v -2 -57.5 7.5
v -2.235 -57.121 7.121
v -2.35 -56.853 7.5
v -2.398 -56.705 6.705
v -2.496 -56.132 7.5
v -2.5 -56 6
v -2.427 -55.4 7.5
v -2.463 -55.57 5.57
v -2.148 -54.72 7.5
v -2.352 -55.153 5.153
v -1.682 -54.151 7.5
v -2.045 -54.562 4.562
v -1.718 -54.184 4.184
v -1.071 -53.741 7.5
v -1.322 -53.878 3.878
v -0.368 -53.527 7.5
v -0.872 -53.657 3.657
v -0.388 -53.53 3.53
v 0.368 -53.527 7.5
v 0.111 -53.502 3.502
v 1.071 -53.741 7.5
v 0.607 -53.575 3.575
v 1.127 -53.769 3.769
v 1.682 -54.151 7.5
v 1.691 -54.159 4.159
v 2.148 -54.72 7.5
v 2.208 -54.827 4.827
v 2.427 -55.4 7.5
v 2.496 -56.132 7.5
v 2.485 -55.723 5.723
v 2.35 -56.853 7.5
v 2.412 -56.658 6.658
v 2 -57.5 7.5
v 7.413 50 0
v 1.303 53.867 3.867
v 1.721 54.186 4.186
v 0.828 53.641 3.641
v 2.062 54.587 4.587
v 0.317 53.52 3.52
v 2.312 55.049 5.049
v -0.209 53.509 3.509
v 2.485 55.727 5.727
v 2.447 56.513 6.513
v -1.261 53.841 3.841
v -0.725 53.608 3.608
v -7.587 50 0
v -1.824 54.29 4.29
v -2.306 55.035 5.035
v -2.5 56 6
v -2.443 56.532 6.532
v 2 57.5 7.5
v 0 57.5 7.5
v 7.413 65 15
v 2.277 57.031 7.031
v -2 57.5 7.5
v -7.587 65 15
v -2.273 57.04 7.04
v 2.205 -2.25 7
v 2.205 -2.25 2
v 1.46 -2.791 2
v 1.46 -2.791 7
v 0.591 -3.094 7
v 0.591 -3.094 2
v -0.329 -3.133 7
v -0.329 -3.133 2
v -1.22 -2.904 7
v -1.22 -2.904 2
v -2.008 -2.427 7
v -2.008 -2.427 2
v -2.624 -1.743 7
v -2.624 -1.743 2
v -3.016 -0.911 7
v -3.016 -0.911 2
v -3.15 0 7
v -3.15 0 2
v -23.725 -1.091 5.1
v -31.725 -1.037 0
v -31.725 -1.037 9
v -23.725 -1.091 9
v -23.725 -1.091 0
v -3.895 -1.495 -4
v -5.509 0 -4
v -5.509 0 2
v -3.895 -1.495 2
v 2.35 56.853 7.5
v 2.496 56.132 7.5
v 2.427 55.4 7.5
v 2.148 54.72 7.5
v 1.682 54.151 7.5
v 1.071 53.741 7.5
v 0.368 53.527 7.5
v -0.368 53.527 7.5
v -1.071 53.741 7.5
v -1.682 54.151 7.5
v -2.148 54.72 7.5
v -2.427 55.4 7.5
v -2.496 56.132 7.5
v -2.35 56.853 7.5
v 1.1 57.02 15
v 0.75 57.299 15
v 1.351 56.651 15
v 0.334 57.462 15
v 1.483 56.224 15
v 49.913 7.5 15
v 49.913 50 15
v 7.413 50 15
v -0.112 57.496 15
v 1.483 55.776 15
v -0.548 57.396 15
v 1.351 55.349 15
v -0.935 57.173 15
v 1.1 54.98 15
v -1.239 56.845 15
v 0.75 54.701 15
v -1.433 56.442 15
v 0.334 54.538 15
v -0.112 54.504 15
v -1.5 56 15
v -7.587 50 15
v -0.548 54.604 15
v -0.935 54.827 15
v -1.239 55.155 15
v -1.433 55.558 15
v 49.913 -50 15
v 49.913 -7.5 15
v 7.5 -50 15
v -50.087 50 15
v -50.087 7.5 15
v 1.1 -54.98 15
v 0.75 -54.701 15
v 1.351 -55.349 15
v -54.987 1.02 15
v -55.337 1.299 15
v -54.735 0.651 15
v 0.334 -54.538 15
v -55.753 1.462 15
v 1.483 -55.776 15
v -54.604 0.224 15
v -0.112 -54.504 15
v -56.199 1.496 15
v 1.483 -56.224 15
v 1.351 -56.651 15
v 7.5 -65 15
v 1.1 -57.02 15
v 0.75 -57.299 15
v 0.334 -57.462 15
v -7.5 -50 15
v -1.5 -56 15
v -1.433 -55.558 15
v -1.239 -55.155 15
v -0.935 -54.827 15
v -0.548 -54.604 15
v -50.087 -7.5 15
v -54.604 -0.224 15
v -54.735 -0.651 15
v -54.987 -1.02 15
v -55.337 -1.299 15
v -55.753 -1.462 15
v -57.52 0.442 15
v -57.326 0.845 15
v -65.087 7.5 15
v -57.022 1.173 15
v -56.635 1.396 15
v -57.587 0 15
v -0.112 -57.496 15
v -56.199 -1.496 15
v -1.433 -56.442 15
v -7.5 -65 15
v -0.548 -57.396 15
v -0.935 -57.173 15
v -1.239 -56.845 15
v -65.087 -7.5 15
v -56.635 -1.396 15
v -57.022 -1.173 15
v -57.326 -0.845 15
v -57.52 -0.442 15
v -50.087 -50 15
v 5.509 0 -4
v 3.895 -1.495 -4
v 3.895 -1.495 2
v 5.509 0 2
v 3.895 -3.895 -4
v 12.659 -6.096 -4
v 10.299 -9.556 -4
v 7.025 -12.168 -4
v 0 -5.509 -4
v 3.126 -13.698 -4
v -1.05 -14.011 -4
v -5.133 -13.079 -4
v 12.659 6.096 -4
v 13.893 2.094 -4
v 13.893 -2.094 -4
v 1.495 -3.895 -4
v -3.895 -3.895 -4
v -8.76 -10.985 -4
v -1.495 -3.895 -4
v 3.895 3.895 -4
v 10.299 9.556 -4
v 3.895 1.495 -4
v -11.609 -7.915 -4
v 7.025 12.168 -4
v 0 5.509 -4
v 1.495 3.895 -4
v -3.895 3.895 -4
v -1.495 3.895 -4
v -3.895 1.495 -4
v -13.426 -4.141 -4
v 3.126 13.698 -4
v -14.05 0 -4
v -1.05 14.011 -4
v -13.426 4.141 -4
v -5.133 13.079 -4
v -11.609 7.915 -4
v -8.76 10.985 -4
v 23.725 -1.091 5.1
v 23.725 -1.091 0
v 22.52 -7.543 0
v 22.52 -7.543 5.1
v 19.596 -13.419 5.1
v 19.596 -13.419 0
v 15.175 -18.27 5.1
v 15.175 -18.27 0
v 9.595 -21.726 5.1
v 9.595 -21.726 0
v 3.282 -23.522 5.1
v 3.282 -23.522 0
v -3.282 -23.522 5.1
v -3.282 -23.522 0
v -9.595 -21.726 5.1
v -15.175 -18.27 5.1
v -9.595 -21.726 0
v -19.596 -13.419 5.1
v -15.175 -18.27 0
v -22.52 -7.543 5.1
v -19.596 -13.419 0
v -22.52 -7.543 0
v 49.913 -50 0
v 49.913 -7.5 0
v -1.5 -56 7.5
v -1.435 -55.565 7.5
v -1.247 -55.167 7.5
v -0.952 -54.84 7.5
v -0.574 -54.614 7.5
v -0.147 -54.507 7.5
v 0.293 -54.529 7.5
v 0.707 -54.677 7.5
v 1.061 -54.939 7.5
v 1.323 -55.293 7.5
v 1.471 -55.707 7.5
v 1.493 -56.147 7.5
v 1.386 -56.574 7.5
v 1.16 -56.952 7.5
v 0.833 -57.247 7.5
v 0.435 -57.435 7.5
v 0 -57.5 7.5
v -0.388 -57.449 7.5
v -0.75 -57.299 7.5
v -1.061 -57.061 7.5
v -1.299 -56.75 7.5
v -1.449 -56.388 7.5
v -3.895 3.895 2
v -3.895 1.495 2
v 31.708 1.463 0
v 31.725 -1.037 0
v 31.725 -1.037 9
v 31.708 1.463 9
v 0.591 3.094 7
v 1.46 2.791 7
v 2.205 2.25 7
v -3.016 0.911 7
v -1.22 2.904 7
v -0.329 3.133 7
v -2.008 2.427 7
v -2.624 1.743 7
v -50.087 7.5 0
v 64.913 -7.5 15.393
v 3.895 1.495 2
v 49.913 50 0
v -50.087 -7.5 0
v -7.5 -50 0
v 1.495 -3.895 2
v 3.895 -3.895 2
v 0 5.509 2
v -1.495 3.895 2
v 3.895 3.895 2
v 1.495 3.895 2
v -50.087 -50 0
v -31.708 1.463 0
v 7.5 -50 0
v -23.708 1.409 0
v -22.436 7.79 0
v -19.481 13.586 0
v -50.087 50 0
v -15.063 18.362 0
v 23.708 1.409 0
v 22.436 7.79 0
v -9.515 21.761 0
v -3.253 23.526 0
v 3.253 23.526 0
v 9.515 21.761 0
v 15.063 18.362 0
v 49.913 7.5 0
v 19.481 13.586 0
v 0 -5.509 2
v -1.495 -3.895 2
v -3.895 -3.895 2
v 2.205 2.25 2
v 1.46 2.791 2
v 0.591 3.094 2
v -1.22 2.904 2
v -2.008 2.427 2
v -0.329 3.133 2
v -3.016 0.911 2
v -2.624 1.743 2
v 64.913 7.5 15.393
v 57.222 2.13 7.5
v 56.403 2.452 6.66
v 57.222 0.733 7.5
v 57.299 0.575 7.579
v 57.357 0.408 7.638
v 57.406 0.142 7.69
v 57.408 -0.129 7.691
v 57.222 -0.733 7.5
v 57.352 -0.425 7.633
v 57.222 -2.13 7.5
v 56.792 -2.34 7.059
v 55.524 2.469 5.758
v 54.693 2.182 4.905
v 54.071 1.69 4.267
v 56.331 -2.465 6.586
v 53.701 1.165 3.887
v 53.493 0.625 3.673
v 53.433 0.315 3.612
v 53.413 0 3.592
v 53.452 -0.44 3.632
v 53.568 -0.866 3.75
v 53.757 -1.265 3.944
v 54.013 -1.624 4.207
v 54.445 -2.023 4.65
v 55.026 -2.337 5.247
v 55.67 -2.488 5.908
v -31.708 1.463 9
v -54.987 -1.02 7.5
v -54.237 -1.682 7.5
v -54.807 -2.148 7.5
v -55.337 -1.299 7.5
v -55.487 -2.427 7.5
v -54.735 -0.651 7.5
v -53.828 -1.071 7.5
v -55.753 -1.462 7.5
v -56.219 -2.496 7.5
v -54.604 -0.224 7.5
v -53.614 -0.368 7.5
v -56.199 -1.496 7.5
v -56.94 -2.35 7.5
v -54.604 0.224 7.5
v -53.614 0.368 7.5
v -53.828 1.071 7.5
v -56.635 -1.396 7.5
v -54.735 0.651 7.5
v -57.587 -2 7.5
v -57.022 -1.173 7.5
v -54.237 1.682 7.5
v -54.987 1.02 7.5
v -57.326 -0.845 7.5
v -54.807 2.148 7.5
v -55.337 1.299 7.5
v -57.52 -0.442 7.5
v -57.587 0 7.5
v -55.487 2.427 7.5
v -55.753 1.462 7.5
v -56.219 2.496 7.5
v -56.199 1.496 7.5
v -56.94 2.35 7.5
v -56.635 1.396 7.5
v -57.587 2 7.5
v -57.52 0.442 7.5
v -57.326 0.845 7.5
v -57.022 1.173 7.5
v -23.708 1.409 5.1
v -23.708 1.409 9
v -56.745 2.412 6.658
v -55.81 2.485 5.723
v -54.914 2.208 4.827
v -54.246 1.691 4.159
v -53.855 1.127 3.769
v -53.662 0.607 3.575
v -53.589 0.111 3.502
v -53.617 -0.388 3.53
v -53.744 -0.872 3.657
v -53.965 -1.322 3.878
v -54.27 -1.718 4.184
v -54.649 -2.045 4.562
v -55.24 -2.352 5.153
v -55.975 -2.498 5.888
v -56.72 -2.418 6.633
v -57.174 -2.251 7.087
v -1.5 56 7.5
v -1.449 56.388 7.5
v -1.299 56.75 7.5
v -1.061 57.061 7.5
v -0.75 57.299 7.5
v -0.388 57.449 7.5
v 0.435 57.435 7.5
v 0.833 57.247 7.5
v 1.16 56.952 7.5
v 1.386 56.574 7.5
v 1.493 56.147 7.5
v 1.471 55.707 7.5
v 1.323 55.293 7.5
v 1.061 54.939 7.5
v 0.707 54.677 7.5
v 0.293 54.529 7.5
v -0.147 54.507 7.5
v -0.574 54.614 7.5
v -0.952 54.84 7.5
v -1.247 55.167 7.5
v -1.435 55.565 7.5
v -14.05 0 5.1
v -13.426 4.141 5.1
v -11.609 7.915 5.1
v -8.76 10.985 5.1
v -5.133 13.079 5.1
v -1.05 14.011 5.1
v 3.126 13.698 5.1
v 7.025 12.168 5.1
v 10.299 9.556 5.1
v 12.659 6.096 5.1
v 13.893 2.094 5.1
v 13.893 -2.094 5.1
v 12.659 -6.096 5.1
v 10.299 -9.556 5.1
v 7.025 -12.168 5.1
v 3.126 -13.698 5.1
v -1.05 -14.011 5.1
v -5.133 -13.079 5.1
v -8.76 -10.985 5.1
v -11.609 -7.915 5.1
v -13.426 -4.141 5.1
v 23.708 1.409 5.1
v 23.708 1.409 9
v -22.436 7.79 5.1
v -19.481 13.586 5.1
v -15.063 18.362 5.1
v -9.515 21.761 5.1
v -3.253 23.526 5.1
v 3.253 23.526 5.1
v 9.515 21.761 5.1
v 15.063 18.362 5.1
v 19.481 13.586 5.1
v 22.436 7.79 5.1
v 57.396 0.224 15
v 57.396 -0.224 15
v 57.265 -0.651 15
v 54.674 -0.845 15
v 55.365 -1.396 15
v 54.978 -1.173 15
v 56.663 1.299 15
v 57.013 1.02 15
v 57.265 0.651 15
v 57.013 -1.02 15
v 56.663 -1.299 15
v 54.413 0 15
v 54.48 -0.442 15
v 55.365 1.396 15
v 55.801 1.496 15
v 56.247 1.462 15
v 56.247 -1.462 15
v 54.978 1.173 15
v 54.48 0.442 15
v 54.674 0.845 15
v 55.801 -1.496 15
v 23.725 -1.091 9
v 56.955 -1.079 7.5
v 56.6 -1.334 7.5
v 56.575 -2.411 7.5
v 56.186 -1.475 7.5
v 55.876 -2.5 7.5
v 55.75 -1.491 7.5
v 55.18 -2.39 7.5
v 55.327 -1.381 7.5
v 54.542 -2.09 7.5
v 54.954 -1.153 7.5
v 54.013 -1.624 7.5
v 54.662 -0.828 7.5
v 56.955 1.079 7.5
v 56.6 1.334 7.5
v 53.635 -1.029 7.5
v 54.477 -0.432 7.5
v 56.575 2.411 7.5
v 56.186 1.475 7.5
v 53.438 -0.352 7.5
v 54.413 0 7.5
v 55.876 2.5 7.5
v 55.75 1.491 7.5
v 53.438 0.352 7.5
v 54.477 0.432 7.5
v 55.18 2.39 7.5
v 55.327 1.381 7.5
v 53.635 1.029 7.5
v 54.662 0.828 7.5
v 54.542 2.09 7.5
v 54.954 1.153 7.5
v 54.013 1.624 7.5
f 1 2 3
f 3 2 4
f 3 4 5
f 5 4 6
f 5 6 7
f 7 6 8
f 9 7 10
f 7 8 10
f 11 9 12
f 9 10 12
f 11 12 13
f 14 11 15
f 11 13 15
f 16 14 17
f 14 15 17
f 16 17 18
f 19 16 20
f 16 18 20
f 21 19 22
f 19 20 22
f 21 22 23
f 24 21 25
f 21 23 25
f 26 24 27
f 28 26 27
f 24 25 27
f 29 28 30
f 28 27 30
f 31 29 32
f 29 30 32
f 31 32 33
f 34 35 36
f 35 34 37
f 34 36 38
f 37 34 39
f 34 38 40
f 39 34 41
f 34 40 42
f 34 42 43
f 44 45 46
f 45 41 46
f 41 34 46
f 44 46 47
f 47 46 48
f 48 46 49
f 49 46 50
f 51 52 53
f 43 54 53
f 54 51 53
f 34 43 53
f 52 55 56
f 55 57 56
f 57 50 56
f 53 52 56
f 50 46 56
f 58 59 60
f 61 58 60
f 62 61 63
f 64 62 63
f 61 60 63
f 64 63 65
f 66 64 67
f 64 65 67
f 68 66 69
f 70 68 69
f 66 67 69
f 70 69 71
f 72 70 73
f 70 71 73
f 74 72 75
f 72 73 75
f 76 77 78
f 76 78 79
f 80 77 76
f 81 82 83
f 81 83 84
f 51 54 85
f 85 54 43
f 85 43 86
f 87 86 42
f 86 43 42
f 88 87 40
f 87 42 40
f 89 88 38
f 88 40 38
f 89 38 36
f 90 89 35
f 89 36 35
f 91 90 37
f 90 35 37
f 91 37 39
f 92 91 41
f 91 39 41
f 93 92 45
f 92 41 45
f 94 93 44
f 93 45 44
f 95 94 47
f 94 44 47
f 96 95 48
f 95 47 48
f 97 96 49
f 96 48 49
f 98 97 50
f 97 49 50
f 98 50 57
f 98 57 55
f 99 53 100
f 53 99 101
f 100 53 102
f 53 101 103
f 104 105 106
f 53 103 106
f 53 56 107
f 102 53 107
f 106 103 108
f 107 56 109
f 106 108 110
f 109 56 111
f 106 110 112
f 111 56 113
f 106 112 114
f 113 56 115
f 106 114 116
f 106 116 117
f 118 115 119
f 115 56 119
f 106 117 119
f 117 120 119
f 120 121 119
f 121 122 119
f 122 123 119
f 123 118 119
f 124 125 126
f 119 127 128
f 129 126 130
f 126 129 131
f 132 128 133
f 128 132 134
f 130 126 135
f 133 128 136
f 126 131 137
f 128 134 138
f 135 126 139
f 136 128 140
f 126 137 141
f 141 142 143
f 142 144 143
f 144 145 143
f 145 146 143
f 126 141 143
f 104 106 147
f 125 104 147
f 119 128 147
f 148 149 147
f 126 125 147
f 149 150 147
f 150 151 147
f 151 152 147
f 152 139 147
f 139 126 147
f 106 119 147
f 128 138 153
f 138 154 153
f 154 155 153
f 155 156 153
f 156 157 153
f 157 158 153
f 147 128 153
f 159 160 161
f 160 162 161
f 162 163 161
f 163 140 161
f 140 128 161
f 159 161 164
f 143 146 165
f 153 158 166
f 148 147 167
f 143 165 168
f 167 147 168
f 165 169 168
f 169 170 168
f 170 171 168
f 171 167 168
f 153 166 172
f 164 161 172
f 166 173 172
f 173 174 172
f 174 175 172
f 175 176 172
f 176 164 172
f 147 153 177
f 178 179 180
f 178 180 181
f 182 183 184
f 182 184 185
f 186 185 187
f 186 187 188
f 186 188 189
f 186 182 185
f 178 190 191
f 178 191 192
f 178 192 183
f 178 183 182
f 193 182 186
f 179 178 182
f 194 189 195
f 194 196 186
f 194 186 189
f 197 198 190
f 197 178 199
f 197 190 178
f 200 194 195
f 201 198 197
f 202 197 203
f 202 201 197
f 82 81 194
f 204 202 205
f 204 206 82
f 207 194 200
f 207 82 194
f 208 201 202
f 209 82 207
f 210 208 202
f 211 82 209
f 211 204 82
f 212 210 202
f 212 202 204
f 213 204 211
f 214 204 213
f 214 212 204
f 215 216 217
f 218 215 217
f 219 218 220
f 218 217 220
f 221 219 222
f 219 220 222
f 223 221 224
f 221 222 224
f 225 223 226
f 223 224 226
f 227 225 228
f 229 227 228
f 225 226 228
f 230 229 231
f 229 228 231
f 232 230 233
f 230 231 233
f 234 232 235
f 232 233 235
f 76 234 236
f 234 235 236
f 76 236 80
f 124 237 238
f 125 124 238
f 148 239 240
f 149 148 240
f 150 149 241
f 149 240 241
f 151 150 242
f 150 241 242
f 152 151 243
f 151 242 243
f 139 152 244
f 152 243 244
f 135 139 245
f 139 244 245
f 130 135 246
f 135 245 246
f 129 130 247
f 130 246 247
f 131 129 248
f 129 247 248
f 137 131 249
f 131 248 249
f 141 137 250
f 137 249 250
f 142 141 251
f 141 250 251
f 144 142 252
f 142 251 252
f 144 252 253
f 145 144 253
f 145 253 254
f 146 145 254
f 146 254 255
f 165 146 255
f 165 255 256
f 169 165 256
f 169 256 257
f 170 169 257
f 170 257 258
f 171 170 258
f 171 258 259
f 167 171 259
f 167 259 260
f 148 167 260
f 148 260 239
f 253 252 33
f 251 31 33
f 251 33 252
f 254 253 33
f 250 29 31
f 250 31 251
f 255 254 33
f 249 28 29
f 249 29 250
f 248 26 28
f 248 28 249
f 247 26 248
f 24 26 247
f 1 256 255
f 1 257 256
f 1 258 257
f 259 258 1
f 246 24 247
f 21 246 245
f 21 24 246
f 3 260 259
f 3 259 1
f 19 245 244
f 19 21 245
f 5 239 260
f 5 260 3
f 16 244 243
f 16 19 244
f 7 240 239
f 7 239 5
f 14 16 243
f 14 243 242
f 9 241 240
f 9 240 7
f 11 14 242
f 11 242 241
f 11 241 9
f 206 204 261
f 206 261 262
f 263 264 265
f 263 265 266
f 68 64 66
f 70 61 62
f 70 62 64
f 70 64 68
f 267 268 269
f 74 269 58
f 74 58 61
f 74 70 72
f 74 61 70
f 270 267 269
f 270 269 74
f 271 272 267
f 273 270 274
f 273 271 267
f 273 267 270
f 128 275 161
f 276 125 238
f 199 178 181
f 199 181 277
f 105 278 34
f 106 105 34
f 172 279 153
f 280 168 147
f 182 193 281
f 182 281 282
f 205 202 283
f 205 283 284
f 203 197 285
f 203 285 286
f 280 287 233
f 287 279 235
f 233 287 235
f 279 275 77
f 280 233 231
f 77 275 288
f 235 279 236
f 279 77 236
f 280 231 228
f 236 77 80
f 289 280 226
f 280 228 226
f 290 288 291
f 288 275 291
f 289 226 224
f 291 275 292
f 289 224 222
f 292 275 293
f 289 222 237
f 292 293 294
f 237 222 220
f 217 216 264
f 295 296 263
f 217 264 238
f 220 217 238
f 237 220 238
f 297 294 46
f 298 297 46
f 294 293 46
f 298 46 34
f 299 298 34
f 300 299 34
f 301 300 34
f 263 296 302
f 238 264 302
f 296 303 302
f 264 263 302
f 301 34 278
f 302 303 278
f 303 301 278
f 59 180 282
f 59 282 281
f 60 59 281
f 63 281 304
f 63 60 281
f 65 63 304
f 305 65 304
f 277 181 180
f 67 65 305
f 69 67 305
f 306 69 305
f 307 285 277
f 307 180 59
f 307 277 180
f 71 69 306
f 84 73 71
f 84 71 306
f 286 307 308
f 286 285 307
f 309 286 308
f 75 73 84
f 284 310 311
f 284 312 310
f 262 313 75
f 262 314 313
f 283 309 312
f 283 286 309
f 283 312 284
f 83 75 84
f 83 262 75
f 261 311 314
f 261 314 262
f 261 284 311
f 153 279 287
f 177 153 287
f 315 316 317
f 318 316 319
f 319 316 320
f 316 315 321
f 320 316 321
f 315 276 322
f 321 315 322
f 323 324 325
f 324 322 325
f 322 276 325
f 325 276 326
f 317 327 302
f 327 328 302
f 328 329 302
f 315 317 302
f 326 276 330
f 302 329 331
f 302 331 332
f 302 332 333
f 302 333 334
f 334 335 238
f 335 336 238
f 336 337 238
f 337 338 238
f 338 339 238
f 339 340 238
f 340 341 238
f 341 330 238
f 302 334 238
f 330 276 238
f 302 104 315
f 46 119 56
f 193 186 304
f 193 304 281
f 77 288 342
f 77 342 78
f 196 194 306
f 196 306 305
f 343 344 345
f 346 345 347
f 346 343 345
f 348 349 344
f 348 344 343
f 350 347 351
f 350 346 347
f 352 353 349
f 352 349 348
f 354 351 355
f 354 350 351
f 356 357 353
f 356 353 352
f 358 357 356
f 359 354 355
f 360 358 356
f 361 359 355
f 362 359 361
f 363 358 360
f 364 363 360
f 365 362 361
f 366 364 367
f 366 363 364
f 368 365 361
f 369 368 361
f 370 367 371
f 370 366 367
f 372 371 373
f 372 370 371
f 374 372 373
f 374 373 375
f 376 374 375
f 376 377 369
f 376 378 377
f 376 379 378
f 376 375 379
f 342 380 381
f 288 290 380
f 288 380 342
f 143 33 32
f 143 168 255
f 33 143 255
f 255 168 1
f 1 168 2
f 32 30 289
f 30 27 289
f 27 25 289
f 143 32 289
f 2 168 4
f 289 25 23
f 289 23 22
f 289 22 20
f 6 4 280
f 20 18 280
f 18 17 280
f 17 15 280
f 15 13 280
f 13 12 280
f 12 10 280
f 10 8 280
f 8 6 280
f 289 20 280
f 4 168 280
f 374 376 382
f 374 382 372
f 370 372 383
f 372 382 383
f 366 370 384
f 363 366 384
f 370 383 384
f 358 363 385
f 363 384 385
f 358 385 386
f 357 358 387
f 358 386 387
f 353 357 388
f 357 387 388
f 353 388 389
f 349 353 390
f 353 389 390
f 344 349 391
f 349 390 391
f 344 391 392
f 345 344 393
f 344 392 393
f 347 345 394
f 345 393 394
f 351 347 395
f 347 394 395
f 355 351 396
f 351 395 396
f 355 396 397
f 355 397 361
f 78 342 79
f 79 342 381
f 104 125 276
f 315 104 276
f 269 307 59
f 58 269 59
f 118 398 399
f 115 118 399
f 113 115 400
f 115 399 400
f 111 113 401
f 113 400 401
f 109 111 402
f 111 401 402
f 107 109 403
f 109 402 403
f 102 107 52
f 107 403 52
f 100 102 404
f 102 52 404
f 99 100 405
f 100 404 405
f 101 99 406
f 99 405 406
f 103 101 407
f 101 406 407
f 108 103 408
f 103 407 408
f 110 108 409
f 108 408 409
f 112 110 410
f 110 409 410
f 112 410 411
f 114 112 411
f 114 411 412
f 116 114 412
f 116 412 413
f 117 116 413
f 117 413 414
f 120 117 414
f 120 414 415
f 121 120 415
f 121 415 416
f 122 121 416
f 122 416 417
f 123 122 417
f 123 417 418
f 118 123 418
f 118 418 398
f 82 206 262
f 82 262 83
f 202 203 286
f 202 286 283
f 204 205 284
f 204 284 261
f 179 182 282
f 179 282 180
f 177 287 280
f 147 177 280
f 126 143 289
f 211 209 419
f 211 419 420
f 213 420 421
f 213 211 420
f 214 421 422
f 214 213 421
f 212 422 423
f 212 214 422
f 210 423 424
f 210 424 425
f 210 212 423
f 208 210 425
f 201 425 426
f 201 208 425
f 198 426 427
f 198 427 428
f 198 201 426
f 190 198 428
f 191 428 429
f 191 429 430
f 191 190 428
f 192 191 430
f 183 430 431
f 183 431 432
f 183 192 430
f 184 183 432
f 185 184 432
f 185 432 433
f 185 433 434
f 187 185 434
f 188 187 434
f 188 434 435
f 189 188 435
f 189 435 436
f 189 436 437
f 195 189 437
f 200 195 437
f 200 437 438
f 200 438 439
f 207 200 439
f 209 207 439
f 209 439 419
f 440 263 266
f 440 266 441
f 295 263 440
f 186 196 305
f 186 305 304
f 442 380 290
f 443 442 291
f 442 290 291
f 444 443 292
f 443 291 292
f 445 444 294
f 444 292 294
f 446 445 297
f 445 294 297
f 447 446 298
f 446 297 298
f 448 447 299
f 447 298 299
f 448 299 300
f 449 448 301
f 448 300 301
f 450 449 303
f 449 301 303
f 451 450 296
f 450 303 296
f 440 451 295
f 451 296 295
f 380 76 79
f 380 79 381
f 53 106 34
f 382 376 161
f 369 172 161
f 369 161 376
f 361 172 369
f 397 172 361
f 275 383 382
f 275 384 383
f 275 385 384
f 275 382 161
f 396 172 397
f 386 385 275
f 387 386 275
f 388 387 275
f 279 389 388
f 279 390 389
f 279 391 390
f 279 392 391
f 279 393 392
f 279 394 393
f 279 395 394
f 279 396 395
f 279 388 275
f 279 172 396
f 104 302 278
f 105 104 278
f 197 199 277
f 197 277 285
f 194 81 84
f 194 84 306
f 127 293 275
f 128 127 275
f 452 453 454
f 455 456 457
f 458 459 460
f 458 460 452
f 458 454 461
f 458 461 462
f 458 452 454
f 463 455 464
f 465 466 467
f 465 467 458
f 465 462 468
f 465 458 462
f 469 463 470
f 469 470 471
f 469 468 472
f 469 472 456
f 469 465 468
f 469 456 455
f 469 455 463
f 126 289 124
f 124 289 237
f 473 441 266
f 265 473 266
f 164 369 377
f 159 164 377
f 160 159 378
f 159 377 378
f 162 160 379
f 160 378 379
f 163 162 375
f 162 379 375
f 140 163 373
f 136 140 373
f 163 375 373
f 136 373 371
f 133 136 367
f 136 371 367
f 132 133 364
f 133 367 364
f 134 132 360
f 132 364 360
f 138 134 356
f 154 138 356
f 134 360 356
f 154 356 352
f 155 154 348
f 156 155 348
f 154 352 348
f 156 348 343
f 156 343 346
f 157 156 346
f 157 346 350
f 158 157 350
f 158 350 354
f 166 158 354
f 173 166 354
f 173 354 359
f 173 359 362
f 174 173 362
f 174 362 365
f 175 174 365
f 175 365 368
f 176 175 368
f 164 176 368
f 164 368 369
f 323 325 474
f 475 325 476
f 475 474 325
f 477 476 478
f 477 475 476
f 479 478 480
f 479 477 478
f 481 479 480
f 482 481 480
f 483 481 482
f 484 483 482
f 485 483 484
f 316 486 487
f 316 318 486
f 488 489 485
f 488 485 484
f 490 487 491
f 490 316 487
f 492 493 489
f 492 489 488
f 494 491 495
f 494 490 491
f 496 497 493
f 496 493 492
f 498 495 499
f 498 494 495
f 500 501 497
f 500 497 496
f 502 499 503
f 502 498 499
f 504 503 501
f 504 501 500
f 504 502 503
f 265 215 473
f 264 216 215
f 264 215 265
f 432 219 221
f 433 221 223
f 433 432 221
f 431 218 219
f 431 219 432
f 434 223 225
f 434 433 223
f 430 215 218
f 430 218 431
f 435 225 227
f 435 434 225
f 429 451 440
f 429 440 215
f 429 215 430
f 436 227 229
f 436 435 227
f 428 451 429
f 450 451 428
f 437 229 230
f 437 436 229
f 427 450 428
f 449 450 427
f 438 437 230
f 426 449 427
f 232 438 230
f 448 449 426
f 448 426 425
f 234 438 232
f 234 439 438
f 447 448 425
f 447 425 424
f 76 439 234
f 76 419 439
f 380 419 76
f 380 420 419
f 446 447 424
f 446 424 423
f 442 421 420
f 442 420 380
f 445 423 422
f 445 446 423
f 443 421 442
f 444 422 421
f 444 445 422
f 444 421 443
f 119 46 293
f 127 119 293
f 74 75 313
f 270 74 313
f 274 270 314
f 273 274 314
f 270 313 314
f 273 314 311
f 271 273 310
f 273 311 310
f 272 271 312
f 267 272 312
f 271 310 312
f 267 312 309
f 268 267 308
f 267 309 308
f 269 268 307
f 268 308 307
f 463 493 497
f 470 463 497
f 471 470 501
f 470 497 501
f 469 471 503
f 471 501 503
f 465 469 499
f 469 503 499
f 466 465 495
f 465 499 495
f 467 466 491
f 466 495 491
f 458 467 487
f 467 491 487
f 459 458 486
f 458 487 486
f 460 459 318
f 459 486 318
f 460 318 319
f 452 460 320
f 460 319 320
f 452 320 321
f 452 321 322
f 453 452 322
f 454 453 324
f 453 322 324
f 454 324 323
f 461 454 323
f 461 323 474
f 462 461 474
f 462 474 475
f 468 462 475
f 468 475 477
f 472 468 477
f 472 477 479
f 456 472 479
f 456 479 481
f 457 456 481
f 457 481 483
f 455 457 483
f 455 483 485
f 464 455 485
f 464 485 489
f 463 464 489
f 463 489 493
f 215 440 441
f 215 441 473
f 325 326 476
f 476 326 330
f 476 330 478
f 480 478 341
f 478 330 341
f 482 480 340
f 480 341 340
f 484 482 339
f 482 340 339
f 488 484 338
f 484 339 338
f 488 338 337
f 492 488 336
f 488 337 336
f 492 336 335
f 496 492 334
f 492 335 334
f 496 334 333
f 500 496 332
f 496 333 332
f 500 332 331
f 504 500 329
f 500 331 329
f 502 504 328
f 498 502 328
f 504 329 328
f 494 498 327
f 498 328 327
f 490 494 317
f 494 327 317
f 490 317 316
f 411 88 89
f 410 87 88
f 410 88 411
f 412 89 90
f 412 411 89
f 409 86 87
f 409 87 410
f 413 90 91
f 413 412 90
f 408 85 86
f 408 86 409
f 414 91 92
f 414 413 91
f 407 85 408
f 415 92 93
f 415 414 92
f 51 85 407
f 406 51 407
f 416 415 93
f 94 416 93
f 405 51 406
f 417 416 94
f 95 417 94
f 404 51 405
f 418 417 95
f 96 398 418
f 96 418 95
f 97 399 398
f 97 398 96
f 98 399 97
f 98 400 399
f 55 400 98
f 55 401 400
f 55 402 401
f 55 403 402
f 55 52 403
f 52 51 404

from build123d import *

# Parameters (mm, degrees)
BOSS_EXTRU_1_DEPTH      = 15
BOSS_EXTRU_2_START      = -7.5
BOSS_EXTRU_2_DEPTH      = 14.913164891
BOSS_EXTRU_2_START_2    = -7.586835109
BOSS_EXTRU_2_2_DEPTH    = 0.086835109
BOSS_EXTRU_2_START_3    = 7.413164891
BOSS_EXTRU_2_3_DEPTH    = 0.086835109
BOSS_EXTRU_3_DEPTH      = 7.5
BOSS_EXTRU_3_DEPTH_BACK = 7.5
ESQUISSE6_R             = 1.5
ENL_V_MAT_EXTRU_1_DEPTH = 15
ESQUISSE7_R             = 2.5
ENL_V_MAT_EXTRU_2_DEPTH = 7.5
ESQUISSE8_R             = 23.75
ESQUISSE8_R_2           = 14.05
ENL_V_MAT_EXTRU_3_DEPTH = 5.1
ENL_V_MAT_EXTRU_4_DEPTH = 9
ESQUISSE15_W            = 7.790942256
ESQUISSE15_H            = 7.790942256
ESQUISSE15_R            = 3
ENL_V_MAT_EXTRU_5_DEPTH = 2
ENL_V_MAT_EXTRU_6_DEPTH = 5
BOSS_EXTRU_6_START      = 4
ESQUISSE18_R            = 14.05
BOSS_EXTRU_6_DEPTH      = 4


# Read off the part's stored shape, not the designer's step: Boss.-Extru.2
with BuildPart() as part:
    # Esquisse1 → Boss.-Extru.1 (new body)
    with BuildSketch(Plane.XY):
        Polygon((49.913164891, 50), (-50.086835109, 50), (-50.086835109, 0), (-50.086835109, -50), (49.913164891, -50), (49.913164891, 0), align=None)
    extrude(amount=BOSS_EXTRU_1_DEPTH)

    # Boss.-Extru.2 outline → Boss.-Extru.2 (add)
    with BuildSketch(Plane.YZ.offset(BOSS_EXTRU_2_START)):
        Polygon((50, 0), (65, 15), (50, 15), align=None)
        Polygon((-50, 0), (-50, 15), (-65, 15), align=None)
    extrude(amount=BOSS_EXTRU_2_DEPTH)

    # Boss.-Extru.2 2 outline → Boss.-Extru.2 2 (add)
    with BuildSketch(Plane.YZ.offset(BOSS_EXTRU_2_START_2)):
        Polygon((50, 0), (65, 15), (50, 15), align=None)
    extrude(amount=BOSS_EXTRU_2_2_DEPTH)

    # Boss.-Extru.2 3 outline → Boss.-Extru.2 3 (add)
    with BuildSketch(Plane.YZ.offset(BOSS_EXTRU_2_START_3)):
        Polygon((-50, 0), (-50, 15), (-65, 15), align=None)
    extrude(amount=BOSS_EXTRU_2_3_DEPTH)

    # Esquisse4 → Boss.-Extru.3 (add, two sides: drawn at the far end of the back side and taken through both)
    with BuildSketch(Plane(origin=(0, 0, 0), x_dir=(1, 0, 0), z_dir=(0, 1, 0)).offset(-BOSS_EXTRU_3_DEPTH_BACK)):
        Polygon((-50.086835109, 0), (-50.086835109, -15), (-65.086835109, -15), align=None)
        Polygon((49.913164891, 0), (49.913164891, -15), (64.913164891, -15.393130345), align=None)
    extrude(amount=BOSS_EXTRU_3_DEPTH + BOSS_EXTRU_3_DEPTH_BACK)

    # Esquisse6 → Enlèv. mat.-Extru.1 (cut)
    with BuildSketch(Plane(origin=(0, 0, 0), x_dir=(-1, 0, 0), z_dir=(0, 0, -1))):
        with Locations((0, -56)):
            Circle(ESQUISSE6_R)
        with Locations((56.086835109, 0)):
            Circle(ESQUISSE6_R)
        with Locations((0, 56)):
            Circle(ESQUISSE6_R)
        with Locations((-55.913164891, 0)):
            Circle(ESQUISSE6_R)
    extrude(amount=-ENL_V_MAT_EXTRU_1_DEPTH, mode=Mode.SUBTRACT)

    # Esquisse7 → Enlèv. mat.-Extru.2 (cut)
    with BuildSketch(Plane(origin=(0, 0, 0), x_dir=(-1, 0, 0), z_dir=(0, 0, -1))):
        with Locations((56.086835109, 0)):
            Circle(ESQUISSE7_R)
        with Locations((0, 56)):
            Circle(ESQUISSE7_R)
        with Locations((-55.913164891, 0)):
            Circle(ESQUISSE7_R)
        with Locations((0, -56)):
            Circle(ESQUISSE7_R)
    extrude(amount=-ENL_V_MAT_EXTRU_2_DEPTH, mode=Mode.SUBTRACT)

    # Esquisse8 → Enlèv. mat.-Extru.3 (cut)
    with BuildSketch(Plane(origin=(0, 0, 0), x_dir=(-1, 0, 0), z_dir=(0, 0, -1))):
        Circle(ESQUISSE8_R)
        Circle(ESQUISSE8_R_2, mode=Mode.SUBTRACT)
    extrude(amount=-ENL_V_MAT_EXTRU_3_DEPTH, mode=Mode.SUBTRACT)

    # Esquisse11 → Enlèv. mat.-Extru.4 (cut)
    with BuildSketch(Plane(origin=(0, 0, 0), x_dir=(-1, 0, 0), z_dir=(0, 0, -1))):
        Polygon((23.724937024, -1.090808521), (23.708156389, 1.409191479), (31.708156389, 1.462889508), (31.724937024, -1.037110492), align=None)
        Polygon((-31.724937024, -1.037110492), (-31.708156389, 1.462889508), (-23.708156389, 1.409191479), (-23.724937024, -1.090808521), align=None)
    extrude(amount=-ENL_V_MAT_EXTRU_4_DEPTH, mode=Mode.SUBTRACT)

    # Esquisse15 → Enlèv. mat.-Extru.5 (cut)
    # profile 1 of 7: a face of its own
    with BuildSketch(Plane(origin=(0, 0, 0), x_dir=(-1, 0, 0), z_dir=(0, 0, -1))):
        Polygon((0, 5.509028101), (-1.495471128, 3.895471128), (1.495471128, 3.895471128), align=None)
    # profile 2 of 7: a face of its own
    with BuildSketch(Plane(origin=(0, 0, 0), x_dir=(-1, 0, 0), z_dir=(0, 0, -1))):
        Polygon((-3.895471128, -1.495471128), (-3.895471128, 1.495471128), (-5.509028101, 0), align=None)
    # profile 3 of 7: a face of its own
    with BuildSketch(Plane(origin=(0, 0, 0), x_dir=(-1, 0, 0), z_dir=(0, 0, -1))):
        Polygon((1.495471128, -3.895471128), (-1.495471128, -3.895471128), (0, -5.509028101), align=None)
    # profile 4 of 7: a face of its own
    with BuildSketch(Plane(origin=(0, 0, 0), x_dir=(-1, 0, 0), z_dir=(0, 0, -1))):
        Polygon((5.509028101, 0), (3.895471128, 1.495471128), (3.895471128, -1.495471128), align=None)
    # profile 5 of 7: a face of its own
    with BuildSketch(Plane(origin=(0, 0, 0), x_dir=(-1, 0, 0), z_dir=(0, 0, -1))):
        Rectangle(ESQUISSE15_W, ESQUISSE15_H)
        Circle(ESQUISSE15_R, mode=Mode.SUBTRACT)
    # profile 6 of 7: a face of its own
    with BuildSketch(Plane(origin=(0, 0, 0), x_dir=(-1, 0, 0), z_dir=(0, 0, -1))):
        with BuildLine():
            ThreePointArc((3, 0), (0.776457135, 2.897777479), (-2.598076211, 1.5))
            Line((-2.598076211, 1.5), (-2.598076211, -1.5))
            ThreePointArc((-2.598076211, -1.5), (0.776457135, -2.897777479), (3, 0))
        make_face()
    # profile 7 of 7: a face of its own
    with BuildSketch(Plane(origin=(0, 0, 0), x_dir=(-1, 0, 0), z_dir=(0, 0, -1))):
        with BuildLine():
            Line((-2.598076211, -1.5), (-2.598076211, 1.5))
            ThreePointArc((-2.598076211, 1.5), (-3, 0), (-2.598076211, -1.5))
        make_face()
    extrude(amount=-ENL_V_MAT_EXTRU_5_DEPTH, mode=Mode.SUBTRACT)

    # Esquisse17 → Enlèv. mat.-Extru.6 (cut)
    with BuildSketch(Plane(origin=(0, 0, 2), x_dir=(-1, 0, 0), z_dir=(0, 0, -1))):
        with BuildLine():
            ThreePointArc((3.15, 0), (1.220286151, 2.904031975), (-2.204540769, 2.25))
            Line((-2.204540769, 2.25), (-2.204540769, -2.25))
            ThreePointArc((-2.204540769, -2.25), (1.220286151, -2.904031975), (3.15, 0))
        make_face()
    extrude(amount=-ENL_V_MAT_EXTRU_6_DEPTH, mode=Mode.SUBTRACT)

    # Esquisse18 → Boss.-Extru.6 (add)
    with BuildSketch(Plane(origin=(0, 0, 0), x_dir=(-1, 0, 0), z_dir=(0, 0, -1)).offset(BOSS_EXTRU_6_START)):
        Circle(ESQUISSE18_R)
        Polygon((0, 5.509028101), (1.495471128, 3.895471128), (3.895471128, 3.895471128), (3.895471128, 1.495471128), (5.509028101, 0), (3.895471128, -1.495471128), (3.895471128, -3.895471128), (1.495471128, -3.895471128), (0, -5.509028101), (-1.495471128, -3.895471128), (-3.895471128, -3.895471128), (-3.895471128, -1.495471128), (-5.509028101, 0), (-3.895471128, 1.495471128), (-3.895471128, 3.895471128), (-1.495471128, 3.895471128), align=None, mode=Mode.SUBTRACT)
    extrude(amount=-BOSS_EXTRU_6_DEPTH)


solid = part.part
